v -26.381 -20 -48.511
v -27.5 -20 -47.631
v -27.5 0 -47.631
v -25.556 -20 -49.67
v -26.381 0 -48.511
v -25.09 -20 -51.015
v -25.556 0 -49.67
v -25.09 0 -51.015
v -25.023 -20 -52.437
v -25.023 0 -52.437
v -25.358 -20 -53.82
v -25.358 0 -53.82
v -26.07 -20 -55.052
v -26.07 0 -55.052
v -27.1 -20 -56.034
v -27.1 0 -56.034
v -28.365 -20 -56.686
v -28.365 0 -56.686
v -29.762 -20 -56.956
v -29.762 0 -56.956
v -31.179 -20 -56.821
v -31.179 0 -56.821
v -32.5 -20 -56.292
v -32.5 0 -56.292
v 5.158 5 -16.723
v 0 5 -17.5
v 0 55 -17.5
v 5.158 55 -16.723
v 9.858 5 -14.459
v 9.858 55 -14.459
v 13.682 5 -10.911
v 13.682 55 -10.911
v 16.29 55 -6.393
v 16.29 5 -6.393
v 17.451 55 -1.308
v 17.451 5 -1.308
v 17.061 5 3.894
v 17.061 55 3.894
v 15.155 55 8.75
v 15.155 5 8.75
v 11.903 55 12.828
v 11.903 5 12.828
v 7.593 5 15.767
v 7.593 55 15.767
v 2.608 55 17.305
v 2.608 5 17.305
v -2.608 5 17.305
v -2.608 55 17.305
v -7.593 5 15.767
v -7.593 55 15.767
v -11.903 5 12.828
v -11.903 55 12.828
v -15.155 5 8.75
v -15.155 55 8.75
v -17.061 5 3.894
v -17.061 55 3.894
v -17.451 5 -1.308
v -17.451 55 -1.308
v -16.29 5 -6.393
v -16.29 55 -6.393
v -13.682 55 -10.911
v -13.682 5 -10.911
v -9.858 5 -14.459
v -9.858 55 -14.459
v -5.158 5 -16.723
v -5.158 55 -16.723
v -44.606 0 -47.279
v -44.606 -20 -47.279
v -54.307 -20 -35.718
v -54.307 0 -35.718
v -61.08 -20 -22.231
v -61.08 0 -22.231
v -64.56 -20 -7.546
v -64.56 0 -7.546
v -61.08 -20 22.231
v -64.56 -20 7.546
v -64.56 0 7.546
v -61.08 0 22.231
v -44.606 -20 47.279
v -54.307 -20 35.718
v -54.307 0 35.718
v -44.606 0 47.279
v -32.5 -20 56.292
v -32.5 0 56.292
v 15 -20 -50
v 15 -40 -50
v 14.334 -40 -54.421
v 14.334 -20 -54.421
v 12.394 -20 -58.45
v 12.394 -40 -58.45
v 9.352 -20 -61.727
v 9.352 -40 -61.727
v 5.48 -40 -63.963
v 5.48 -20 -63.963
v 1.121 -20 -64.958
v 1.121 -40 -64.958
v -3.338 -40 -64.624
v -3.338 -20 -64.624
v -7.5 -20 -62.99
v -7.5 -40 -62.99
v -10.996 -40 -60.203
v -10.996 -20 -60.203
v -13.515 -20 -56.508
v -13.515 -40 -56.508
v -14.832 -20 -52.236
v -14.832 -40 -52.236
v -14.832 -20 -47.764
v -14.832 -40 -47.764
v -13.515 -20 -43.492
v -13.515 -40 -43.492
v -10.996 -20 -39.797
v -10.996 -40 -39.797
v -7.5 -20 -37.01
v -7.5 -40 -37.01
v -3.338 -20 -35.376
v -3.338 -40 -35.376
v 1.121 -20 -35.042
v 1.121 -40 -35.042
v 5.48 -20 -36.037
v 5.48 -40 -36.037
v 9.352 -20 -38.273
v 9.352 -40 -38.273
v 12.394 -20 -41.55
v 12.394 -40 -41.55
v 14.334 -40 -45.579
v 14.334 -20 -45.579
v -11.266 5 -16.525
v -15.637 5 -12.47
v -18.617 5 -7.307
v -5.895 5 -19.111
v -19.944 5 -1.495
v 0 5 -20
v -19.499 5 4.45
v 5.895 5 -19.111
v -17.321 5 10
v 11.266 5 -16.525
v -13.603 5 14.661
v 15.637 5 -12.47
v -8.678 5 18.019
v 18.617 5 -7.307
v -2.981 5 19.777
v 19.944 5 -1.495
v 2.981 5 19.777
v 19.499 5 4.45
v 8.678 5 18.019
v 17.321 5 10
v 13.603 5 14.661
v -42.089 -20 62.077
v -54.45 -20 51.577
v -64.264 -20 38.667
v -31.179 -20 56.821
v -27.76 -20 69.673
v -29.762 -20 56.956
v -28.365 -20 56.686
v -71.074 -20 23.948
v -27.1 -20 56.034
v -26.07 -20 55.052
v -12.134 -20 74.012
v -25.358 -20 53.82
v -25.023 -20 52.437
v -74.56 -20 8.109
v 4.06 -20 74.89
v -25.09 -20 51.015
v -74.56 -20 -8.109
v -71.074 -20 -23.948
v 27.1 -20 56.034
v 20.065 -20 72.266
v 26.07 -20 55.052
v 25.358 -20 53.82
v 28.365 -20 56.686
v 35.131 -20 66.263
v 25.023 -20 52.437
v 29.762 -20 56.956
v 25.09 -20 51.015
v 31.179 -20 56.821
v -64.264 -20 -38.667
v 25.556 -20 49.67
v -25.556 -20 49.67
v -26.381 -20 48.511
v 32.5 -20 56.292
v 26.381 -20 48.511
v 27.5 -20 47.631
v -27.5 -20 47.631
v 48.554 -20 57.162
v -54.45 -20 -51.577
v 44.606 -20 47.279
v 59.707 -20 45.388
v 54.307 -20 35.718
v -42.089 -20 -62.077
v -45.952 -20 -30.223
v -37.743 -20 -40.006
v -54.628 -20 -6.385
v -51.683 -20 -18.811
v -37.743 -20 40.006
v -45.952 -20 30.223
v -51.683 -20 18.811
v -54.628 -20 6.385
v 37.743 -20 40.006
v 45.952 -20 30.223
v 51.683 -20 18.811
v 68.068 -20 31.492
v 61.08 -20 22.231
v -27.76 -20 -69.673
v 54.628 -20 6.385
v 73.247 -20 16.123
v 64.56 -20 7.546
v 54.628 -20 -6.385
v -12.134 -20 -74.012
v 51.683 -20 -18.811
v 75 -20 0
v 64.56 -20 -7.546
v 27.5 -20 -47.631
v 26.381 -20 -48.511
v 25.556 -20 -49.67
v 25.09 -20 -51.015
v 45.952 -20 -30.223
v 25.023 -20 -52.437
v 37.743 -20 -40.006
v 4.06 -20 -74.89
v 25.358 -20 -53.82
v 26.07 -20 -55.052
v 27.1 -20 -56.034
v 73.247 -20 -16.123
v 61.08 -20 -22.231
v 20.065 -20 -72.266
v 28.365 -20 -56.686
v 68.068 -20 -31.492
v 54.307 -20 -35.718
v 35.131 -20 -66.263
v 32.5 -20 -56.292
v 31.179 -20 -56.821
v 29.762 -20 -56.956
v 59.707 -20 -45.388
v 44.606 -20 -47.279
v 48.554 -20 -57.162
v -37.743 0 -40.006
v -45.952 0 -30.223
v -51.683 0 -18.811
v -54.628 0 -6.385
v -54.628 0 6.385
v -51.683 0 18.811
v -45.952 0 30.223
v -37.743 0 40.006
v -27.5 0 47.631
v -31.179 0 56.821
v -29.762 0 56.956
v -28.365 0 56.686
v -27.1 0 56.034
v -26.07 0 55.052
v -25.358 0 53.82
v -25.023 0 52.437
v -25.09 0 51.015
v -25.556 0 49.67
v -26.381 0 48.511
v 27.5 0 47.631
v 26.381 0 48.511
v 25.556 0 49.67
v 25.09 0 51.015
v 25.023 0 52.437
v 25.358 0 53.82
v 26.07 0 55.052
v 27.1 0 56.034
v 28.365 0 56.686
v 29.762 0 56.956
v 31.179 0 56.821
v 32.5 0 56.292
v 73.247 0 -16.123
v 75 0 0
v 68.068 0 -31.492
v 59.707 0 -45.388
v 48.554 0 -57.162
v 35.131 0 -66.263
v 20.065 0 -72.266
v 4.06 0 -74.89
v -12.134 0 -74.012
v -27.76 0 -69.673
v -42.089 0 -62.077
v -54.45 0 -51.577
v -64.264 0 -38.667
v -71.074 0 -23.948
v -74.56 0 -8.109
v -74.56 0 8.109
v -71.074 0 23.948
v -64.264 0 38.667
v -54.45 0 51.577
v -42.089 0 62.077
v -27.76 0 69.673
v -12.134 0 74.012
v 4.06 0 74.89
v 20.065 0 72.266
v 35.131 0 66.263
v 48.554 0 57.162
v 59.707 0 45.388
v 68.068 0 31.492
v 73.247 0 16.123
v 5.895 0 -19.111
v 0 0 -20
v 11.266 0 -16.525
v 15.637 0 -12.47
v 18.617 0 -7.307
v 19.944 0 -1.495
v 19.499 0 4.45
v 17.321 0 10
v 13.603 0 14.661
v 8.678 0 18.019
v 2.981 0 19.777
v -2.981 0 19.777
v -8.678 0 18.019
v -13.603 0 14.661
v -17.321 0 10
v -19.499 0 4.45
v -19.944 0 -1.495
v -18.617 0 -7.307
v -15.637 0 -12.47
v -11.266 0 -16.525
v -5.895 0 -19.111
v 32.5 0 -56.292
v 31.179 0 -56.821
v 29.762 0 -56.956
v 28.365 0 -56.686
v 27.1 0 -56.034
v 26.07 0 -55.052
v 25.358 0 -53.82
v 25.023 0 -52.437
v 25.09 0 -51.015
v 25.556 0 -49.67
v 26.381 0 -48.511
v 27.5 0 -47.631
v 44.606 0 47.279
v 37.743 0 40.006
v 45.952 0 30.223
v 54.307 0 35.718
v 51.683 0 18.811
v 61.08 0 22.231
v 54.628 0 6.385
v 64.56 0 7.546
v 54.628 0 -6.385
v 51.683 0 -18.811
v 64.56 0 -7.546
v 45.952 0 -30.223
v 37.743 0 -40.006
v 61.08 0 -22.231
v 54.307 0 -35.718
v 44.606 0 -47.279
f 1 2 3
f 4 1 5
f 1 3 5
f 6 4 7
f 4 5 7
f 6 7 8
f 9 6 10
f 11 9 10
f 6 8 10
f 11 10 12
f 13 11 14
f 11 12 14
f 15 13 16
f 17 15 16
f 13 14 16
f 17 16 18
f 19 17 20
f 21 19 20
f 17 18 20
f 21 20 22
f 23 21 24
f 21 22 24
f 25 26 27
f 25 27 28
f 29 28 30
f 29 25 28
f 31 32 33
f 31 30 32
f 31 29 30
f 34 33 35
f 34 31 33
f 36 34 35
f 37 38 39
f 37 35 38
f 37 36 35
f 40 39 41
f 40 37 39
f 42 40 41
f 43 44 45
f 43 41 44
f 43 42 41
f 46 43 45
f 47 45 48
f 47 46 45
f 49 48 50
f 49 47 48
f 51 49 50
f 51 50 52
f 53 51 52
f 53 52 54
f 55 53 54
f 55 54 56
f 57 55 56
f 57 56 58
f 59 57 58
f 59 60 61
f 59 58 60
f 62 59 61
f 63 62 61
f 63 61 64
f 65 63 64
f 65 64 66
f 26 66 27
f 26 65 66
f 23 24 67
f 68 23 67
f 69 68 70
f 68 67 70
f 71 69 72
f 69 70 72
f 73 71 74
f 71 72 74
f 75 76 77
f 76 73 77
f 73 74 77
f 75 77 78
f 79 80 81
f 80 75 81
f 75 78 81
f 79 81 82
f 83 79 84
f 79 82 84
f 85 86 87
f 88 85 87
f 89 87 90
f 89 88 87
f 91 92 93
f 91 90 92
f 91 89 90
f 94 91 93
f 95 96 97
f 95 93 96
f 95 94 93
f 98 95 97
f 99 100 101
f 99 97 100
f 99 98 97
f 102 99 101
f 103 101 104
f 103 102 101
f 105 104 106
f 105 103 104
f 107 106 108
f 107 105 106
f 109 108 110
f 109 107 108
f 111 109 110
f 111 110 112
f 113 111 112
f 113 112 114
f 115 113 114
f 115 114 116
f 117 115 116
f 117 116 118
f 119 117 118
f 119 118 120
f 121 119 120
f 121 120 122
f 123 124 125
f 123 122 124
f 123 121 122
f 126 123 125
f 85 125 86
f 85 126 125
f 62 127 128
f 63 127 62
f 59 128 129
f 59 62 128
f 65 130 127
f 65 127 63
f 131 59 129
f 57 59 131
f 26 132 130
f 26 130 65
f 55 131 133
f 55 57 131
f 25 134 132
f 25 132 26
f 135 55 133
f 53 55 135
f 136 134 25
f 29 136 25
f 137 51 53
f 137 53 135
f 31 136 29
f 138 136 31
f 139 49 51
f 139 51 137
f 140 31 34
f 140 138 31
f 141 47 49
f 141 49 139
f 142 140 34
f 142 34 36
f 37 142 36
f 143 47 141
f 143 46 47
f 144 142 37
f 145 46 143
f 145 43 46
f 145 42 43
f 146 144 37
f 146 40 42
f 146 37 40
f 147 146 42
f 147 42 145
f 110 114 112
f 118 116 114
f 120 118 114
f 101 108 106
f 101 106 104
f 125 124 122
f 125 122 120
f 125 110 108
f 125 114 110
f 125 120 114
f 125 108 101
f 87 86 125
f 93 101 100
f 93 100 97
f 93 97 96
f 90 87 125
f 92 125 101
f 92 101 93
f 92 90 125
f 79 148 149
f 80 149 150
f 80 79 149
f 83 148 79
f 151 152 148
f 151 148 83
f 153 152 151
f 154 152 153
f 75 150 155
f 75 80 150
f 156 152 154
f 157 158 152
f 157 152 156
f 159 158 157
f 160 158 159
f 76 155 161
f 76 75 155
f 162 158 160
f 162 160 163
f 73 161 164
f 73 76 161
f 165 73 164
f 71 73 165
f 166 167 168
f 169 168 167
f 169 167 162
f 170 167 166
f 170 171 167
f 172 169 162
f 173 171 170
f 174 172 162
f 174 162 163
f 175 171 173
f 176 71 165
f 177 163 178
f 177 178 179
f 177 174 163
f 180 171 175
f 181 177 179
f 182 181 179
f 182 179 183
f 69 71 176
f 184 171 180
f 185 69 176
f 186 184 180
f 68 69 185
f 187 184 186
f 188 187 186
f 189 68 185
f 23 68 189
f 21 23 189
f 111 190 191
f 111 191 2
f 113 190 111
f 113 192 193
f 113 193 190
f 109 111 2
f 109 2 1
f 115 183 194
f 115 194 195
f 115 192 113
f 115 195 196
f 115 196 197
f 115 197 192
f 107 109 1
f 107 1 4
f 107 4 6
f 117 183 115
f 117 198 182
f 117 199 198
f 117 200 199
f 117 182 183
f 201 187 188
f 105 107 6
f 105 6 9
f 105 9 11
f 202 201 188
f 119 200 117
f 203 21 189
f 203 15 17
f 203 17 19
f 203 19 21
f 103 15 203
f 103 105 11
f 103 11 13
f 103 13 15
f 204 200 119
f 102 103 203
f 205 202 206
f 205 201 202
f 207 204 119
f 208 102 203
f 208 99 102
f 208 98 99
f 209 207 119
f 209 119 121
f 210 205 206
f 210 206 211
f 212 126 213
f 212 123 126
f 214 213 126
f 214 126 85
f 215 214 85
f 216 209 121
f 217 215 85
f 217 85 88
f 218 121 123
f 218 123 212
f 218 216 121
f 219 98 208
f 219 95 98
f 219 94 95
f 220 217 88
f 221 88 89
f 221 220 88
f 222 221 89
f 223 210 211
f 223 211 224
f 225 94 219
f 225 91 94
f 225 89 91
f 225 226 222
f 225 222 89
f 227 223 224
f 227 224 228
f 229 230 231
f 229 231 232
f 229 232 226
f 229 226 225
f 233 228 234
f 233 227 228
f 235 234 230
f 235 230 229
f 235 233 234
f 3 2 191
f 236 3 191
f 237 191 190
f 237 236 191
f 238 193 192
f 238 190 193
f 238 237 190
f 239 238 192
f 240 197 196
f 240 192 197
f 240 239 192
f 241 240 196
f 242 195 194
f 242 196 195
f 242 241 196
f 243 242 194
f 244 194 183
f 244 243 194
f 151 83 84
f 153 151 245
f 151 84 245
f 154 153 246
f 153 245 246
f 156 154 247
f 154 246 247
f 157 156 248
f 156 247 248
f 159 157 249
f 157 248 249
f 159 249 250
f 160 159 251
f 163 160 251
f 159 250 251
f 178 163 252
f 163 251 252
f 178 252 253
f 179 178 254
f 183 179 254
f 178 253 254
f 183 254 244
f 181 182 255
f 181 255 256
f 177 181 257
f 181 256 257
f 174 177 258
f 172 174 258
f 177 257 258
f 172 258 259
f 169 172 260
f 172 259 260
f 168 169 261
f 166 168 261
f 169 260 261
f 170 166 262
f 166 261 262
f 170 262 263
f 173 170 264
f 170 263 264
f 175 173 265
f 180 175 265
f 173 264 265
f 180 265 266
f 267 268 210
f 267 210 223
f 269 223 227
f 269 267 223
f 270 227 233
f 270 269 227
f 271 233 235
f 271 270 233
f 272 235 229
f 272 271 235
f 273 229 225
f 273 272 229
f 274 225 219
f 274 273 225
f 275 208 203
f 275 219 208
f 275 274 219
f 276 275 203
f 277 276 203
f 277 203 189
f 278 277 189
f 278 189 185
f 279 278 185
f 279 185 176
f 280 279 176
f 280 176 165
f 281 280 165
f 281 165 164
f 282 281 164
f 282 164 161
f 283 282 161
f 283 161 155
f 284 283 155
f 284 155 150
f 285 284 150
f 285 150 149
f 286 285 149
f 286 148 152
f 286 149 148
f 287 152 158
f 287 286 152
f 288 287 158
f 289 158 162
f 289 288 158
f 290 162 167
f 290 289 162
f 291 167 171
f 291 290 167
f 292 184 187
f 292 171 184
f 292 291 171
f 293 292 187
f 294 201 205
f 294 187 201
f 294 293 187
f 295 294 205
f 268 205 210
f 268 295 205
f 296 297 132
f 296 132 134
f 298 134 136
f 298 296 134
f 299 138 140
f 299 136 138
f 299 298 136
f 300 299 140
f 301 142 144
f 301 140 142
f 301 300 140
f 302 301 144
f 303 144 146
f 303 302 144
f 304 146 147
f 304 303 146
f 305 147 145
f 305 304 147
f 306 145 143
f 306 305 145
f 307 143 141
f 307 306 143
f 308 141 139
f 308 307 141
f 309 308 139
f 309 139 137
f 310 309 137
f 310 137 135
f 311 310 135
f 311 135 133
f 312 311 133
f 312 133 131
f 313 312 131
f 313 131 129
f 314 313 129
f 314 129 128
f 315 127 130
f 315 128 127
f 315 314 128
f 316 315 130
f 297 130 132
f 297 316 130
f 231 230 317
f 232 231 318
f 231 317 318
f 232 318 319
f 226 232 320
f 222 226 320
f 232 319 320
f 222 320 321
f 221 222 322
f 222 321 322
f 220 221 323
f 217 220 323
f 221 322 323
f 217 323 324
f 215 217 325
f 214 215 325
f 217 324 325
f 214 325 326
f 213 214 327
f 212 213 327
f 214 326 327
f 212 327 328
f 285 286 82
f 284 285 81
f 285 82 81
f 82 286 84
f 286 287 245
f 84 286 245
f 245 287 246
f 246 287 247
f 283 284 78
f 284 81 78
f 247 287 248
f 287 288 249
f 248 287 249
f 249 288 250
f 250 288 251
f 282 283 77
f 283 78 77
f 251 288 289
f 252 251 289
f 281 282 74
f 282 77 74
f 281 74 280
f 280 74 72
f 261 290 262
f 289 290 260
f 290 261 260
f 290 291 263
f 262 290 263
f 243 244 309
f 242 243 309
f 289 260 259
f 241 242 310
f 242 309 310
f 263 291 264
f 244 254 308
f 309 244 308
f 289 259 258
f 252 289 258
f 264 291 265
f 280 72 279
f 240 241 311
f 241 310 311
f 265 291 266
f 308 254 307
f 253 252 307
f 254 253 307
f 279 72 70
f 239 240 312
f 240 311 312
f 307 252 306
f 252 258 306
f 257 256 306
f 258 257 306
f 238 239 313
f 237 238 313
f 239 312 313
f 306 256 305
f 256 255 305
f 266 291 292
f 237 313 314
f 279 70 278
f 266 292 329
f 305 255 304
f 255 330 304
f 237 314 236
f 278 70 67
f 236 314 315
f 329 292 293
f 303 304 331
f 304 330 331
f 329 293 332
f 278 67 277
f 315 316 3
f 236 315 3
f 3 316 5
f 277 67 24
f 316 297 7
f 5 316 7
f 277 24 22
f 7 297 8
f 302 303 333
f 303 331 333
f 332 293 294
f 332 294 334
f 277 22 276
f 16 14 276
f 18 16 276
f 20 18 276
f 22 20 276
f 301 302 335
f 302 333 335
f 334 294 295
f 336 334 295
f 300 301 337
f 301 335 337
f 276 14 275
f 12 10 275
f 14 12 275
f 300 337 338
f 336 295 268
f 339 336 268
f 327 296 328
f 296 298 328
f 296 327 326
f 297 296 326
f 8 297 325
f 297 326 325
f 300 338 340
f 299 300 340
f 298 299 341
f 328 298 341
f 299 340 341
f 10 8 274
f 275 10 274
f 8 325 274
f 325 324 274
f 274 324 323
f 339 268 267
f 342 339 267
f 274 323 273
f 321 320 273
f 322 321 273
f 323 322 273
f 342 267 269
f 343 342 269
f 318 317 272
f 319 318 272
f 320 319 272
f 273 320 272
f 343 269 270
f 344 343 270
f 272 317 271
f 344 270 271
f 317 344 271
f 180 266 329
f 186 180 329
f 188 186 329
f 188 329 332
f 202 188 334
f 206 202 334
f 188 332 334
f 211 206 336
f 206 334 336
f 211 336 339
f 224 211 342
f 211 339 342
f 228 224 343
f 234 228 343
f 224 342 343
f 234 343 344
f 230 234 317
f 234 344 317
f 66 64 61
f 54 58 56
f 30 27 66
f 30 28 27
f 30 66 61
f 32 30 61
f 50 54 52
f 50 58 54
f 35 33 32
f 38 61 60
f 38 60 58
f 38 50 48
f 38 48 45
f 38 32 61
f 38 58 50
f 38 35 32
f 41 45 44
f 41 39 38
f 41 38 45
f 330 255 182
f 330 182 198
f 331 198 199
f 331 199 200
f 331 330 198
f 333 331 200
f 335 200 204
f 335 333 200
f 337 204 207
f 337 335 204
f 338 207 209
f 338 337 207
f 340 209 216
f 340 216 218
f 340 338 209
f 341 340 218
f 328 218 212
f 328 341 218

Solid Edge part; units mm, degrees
sketch "Sketch1" plane through (0, 0, 0) normal (0, -1, 0) x (1, 0, 0)
  circle A0 centre (0, 0) radius 75
  arc A1 (-32.5, 56.2917) -> (-27.5, 47.6314) centre (-30, 51.9615) cw
  arc A2 (-27.5, 47.6314) -> (-27.5, -47.6314) centre (0, 0) ccw
  arc A3 (-27.5, -47.6314) -> (-32.5, -56.2917) centre (-30, -51.9615) cw
  arc A4 (-32.5, 56.2917) -> (-32.5, -56.2917) centre (0, 0) ccw
  arc A5 (27.5, 47.6314) -> (32.5, 56.2917) centre (30, 51.9615) cw
  arc A6 (32.5, 56.2917) -> (32.5, -56.2917) centre (0, 0) cw
  arc A7 (32.5, -56.2917) -> (27.5, -47.6314) centre (30, -51.9615) cw
  arc A8 (27.5, 47.6314) -> (27.5, -47.6314) centre (0, 0) cw
  dimension "D1" = 150
extrude "ExtrudedProtrusion_1" add sketch "Sketch1" along normal blind 20
sketch "Sketch2" plane through (0, -20, 0) normal (0, -1, 0) x (1, 0, 0)
  circle A0 centre (0, -50) radius 15
extrude "ExtrudedProtrusion_2" add sketch "Sketch2" along normal blind 20
sketch "Sketch3" plane through (0, 0, 0) normal (0, 1, 0) x (0, 0, -1)
  circle A0 centre (0, 0) radius 20
extrude "ExtrudedProtrusion_3" add sketch "Sketch3" along normal blind 5
sketch "Sketch4" plane through (0, 5, 0) normal (0, 1, 0) x (0, 0, -1)
  circle A0 centre (0, 0) radius 17.5
extrude "ExtrudedProtrusion_4" add sketch "Sketch4" along normal blind 50
